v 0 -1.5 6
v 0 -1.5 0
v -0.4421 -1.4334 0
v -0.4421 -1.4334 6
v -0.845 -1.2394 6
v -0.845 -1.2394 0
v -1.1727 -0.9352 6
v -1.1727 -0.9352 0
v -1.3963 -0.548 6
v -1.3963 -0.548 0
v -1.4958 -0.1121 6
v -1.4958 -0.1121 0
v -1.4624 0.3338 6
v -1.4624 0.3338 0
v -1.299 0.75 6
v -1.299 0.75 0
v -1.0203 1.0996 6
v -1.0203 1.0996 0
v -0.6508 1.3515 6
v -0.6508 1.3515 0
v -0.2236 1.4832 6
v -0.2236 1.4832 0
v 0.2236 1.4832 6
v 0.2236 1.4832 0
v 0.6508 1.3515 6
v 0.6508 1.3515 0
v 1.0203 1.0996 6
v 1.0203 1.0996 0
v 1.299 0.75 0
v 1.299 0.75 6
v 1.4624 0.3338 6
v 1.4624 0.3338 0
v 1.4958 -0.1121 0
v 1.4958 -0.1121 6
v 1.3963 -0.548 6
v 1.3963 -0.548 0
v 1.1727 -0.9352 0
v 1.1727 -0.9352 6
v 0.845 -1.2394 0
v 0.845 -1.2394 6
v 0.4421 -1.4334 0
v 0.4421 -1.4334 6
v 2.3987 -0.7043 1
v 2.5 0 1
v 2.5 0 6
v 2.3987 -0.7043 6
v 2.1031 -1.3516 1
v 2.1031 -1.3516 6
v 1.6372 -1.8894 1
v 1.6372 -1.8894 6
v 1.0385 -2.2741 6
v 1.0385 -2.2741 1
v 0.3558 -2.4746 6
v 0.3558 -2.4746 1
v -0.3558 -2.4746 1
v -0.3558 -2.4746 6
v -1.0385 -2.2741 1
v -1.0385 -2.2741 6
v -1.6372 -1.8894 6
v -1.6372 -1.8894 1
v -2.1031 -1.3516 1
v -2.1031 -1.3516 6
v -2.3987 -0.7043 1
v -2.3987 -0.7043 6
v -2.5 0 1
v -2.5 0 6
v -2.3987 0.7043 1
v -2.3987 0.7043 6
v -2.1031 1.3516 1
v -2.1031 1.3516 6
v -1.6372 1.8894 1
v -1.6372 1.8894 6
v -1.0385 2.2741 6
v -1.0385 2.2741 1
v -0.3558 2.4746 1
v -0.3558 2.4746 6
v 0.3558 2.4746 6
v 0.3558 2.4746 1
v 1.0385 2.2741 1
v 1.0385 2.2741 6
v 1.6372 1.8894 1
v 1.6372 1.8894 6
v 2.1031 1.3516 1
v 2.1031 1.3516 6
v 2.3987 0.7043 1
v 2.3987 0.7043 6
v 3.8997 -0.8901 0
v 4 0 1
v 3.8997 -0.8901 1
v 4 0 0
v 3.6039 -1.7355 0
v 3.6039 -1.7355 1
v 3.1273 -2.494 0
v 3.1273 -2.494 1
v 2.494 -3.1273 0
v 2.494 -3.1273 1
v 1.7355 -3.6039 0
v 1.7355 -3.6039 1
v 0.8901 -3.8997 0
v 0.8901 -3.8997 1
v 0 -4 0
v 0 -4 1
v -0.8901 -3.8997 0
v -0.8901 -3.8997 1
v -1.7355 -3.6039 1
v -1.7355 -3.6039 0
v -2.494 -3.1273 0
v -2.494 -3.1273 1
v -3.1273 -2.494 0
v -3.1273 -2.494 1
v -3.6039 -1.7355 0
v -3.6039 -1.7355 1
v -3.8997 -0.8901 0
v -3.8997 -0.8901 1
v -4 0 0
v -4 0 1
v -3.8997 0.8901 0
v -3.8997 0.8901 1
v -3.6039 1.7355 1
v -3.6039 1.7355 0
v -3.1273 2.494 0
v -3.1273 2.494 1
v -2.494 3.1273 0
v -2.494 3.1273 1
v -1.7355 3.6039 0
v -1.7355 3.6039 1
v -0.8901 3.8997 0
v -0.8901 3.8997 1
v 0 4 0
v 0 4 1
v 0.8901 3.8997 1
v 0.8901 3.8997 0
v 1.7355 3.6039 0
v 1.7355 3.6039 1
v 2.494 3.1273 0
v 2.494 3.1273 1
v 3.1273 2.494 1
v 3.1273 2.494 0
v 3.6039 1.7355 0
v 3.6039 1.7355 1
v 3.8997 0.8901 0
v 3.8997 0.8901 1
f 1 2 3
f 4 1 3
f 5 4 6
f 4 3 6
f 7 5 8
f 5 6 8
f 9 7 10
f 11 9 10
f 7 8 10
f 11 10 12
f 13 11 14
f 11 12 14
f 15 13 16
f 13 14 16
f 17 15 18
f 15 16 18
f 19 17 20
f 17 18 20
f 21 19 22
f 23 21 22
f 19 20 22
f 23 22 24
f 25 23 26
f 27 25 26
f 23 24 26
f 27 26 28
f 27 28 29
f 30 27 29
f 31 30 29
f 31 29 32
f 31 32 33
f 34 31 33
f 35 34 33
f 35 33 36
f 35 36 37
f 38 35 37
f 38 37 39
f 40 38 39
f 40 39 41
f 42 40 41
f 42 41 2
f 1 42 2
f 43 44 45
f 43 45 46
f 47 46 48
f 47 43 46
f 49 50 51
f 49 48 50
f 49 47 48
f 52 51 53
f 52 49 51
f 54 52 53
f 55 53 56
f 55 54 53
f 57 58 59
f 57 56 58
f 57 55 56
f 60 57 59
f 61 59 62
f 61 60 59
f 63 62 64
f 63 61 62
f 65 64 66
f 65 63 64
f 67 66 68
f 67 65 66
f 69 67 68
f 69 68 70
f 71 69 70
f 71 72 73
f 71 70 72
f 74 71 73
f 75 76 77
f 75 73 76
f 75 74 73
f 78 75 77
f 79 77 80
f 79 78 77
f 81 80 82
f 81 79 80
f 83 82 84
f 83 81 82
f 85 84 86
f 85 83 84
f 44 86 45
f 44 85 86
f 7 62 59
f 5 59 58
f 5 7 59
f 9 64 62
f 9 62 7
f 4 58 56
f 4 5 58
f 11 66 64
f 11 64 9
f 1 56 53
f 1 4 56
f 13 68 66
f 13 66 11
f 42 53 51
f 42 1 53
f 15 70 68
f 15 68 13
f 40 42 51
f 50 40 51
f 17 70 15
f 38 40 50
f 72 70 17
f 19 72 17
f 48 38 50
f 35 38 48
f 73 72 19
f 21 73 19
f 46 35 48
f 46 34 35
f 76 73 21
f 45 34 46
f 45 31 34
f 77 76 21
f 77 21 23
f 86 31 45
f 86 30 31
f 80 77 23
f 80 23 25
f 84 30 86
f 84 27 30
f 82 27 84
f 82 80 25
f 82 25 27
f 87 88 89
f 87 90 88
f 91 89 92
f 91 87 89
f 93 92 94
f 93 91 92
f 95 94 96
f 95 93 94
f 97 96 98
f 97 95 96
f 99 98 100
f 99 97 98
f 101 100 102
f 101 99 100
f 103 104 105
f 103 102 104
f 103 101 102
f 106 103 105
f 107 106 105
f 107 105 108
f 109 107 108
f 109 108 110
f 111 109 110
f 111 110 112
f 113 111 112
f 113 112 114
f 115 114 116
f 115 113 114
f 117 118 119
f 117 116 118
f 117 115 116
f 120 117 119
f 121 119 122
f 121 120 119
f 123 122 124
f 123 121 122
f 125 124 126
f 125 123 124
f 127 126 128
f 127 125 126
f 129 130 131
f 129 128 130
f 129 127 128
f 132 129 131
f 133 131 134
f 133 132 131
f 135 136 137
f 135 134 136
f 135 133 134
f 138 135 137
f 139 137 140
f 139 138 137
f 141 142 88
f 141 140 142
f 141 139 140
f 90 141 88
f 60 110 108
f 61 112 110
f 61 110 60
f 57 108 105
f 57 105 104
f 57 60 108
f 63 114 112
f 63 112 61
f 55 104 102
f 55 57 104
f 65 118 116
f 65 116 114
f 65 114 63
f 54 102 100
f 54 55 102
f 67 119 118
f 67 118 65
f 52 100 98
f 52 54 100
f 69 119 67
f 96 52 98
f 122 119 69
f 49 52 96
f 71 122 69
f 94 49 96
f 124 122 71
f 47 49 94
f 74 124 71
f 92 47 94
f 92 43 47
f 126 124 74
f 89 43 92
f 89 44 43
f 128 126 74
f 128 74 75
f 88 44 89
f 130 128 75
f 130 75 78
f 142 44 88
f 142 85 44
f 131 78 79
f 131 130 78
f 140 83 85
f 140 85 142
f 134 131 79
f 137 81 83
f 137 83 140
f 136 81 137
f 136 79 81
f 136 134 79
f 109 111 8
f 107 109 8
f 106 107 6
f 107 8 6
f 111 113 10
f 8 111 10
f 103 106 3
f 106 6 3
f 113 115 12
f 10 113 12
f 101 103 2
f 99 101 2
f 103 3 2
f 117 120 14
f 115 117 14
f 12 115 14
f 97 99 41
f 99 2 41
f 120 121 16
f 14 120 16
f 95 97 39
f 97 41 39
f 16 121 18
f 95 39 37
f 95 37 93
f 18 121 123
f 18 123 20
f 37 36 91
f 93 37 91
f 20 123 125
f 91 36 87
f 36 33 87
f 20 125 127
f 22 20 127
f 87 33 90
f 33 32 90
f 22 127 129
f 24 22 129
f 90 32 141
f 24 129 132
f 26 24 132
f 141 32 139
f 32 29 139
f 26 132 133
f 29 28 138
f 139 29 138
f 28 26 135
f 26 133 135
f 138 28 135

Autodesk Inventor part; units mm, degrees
ref_plane "YZ Plane" through (0, 0, 0) normal (1, 0, 0) x (0, 1, 0)
ref_plane "XZ Plane" through (0, 0, 0) normal (0, 1, 0) x (-1, 0, 0)
ref_plane "XY Plane" through (0, 0, 0) normal (0, 0, 1) x (1, 0, 0)
sketch "スケッチ1" plane through (0, 0, 0) normal (0, 0, 1) x (1, 0, 0)
  circle A0 centre (0, 0) radius 4
  dimension "d0" = 8
extrude "押し出し1" add sketch "スケッチ1" along normal blind 1
sketch "スケッチ2" plane through (0, 0, 1) normal (0, 0, 1) x (1, 0, 0)
  circle A0 centre (0, 0) radius 2.5
  dimension "d3" = 5
extrude "押し出し2" add sketch "スケッチ2" along normal blind 5
sketch "スケッチ3" plane through (0, 0, 6) normal (0, 0, 1) x (1, 0, 0)
  point P0 (0, 0)
  point P1 (0, 0)
hole "穴1" at (0, 0, 6) direction (0, 0, -1) diameter 3 end through all
properties part number "RD016"
